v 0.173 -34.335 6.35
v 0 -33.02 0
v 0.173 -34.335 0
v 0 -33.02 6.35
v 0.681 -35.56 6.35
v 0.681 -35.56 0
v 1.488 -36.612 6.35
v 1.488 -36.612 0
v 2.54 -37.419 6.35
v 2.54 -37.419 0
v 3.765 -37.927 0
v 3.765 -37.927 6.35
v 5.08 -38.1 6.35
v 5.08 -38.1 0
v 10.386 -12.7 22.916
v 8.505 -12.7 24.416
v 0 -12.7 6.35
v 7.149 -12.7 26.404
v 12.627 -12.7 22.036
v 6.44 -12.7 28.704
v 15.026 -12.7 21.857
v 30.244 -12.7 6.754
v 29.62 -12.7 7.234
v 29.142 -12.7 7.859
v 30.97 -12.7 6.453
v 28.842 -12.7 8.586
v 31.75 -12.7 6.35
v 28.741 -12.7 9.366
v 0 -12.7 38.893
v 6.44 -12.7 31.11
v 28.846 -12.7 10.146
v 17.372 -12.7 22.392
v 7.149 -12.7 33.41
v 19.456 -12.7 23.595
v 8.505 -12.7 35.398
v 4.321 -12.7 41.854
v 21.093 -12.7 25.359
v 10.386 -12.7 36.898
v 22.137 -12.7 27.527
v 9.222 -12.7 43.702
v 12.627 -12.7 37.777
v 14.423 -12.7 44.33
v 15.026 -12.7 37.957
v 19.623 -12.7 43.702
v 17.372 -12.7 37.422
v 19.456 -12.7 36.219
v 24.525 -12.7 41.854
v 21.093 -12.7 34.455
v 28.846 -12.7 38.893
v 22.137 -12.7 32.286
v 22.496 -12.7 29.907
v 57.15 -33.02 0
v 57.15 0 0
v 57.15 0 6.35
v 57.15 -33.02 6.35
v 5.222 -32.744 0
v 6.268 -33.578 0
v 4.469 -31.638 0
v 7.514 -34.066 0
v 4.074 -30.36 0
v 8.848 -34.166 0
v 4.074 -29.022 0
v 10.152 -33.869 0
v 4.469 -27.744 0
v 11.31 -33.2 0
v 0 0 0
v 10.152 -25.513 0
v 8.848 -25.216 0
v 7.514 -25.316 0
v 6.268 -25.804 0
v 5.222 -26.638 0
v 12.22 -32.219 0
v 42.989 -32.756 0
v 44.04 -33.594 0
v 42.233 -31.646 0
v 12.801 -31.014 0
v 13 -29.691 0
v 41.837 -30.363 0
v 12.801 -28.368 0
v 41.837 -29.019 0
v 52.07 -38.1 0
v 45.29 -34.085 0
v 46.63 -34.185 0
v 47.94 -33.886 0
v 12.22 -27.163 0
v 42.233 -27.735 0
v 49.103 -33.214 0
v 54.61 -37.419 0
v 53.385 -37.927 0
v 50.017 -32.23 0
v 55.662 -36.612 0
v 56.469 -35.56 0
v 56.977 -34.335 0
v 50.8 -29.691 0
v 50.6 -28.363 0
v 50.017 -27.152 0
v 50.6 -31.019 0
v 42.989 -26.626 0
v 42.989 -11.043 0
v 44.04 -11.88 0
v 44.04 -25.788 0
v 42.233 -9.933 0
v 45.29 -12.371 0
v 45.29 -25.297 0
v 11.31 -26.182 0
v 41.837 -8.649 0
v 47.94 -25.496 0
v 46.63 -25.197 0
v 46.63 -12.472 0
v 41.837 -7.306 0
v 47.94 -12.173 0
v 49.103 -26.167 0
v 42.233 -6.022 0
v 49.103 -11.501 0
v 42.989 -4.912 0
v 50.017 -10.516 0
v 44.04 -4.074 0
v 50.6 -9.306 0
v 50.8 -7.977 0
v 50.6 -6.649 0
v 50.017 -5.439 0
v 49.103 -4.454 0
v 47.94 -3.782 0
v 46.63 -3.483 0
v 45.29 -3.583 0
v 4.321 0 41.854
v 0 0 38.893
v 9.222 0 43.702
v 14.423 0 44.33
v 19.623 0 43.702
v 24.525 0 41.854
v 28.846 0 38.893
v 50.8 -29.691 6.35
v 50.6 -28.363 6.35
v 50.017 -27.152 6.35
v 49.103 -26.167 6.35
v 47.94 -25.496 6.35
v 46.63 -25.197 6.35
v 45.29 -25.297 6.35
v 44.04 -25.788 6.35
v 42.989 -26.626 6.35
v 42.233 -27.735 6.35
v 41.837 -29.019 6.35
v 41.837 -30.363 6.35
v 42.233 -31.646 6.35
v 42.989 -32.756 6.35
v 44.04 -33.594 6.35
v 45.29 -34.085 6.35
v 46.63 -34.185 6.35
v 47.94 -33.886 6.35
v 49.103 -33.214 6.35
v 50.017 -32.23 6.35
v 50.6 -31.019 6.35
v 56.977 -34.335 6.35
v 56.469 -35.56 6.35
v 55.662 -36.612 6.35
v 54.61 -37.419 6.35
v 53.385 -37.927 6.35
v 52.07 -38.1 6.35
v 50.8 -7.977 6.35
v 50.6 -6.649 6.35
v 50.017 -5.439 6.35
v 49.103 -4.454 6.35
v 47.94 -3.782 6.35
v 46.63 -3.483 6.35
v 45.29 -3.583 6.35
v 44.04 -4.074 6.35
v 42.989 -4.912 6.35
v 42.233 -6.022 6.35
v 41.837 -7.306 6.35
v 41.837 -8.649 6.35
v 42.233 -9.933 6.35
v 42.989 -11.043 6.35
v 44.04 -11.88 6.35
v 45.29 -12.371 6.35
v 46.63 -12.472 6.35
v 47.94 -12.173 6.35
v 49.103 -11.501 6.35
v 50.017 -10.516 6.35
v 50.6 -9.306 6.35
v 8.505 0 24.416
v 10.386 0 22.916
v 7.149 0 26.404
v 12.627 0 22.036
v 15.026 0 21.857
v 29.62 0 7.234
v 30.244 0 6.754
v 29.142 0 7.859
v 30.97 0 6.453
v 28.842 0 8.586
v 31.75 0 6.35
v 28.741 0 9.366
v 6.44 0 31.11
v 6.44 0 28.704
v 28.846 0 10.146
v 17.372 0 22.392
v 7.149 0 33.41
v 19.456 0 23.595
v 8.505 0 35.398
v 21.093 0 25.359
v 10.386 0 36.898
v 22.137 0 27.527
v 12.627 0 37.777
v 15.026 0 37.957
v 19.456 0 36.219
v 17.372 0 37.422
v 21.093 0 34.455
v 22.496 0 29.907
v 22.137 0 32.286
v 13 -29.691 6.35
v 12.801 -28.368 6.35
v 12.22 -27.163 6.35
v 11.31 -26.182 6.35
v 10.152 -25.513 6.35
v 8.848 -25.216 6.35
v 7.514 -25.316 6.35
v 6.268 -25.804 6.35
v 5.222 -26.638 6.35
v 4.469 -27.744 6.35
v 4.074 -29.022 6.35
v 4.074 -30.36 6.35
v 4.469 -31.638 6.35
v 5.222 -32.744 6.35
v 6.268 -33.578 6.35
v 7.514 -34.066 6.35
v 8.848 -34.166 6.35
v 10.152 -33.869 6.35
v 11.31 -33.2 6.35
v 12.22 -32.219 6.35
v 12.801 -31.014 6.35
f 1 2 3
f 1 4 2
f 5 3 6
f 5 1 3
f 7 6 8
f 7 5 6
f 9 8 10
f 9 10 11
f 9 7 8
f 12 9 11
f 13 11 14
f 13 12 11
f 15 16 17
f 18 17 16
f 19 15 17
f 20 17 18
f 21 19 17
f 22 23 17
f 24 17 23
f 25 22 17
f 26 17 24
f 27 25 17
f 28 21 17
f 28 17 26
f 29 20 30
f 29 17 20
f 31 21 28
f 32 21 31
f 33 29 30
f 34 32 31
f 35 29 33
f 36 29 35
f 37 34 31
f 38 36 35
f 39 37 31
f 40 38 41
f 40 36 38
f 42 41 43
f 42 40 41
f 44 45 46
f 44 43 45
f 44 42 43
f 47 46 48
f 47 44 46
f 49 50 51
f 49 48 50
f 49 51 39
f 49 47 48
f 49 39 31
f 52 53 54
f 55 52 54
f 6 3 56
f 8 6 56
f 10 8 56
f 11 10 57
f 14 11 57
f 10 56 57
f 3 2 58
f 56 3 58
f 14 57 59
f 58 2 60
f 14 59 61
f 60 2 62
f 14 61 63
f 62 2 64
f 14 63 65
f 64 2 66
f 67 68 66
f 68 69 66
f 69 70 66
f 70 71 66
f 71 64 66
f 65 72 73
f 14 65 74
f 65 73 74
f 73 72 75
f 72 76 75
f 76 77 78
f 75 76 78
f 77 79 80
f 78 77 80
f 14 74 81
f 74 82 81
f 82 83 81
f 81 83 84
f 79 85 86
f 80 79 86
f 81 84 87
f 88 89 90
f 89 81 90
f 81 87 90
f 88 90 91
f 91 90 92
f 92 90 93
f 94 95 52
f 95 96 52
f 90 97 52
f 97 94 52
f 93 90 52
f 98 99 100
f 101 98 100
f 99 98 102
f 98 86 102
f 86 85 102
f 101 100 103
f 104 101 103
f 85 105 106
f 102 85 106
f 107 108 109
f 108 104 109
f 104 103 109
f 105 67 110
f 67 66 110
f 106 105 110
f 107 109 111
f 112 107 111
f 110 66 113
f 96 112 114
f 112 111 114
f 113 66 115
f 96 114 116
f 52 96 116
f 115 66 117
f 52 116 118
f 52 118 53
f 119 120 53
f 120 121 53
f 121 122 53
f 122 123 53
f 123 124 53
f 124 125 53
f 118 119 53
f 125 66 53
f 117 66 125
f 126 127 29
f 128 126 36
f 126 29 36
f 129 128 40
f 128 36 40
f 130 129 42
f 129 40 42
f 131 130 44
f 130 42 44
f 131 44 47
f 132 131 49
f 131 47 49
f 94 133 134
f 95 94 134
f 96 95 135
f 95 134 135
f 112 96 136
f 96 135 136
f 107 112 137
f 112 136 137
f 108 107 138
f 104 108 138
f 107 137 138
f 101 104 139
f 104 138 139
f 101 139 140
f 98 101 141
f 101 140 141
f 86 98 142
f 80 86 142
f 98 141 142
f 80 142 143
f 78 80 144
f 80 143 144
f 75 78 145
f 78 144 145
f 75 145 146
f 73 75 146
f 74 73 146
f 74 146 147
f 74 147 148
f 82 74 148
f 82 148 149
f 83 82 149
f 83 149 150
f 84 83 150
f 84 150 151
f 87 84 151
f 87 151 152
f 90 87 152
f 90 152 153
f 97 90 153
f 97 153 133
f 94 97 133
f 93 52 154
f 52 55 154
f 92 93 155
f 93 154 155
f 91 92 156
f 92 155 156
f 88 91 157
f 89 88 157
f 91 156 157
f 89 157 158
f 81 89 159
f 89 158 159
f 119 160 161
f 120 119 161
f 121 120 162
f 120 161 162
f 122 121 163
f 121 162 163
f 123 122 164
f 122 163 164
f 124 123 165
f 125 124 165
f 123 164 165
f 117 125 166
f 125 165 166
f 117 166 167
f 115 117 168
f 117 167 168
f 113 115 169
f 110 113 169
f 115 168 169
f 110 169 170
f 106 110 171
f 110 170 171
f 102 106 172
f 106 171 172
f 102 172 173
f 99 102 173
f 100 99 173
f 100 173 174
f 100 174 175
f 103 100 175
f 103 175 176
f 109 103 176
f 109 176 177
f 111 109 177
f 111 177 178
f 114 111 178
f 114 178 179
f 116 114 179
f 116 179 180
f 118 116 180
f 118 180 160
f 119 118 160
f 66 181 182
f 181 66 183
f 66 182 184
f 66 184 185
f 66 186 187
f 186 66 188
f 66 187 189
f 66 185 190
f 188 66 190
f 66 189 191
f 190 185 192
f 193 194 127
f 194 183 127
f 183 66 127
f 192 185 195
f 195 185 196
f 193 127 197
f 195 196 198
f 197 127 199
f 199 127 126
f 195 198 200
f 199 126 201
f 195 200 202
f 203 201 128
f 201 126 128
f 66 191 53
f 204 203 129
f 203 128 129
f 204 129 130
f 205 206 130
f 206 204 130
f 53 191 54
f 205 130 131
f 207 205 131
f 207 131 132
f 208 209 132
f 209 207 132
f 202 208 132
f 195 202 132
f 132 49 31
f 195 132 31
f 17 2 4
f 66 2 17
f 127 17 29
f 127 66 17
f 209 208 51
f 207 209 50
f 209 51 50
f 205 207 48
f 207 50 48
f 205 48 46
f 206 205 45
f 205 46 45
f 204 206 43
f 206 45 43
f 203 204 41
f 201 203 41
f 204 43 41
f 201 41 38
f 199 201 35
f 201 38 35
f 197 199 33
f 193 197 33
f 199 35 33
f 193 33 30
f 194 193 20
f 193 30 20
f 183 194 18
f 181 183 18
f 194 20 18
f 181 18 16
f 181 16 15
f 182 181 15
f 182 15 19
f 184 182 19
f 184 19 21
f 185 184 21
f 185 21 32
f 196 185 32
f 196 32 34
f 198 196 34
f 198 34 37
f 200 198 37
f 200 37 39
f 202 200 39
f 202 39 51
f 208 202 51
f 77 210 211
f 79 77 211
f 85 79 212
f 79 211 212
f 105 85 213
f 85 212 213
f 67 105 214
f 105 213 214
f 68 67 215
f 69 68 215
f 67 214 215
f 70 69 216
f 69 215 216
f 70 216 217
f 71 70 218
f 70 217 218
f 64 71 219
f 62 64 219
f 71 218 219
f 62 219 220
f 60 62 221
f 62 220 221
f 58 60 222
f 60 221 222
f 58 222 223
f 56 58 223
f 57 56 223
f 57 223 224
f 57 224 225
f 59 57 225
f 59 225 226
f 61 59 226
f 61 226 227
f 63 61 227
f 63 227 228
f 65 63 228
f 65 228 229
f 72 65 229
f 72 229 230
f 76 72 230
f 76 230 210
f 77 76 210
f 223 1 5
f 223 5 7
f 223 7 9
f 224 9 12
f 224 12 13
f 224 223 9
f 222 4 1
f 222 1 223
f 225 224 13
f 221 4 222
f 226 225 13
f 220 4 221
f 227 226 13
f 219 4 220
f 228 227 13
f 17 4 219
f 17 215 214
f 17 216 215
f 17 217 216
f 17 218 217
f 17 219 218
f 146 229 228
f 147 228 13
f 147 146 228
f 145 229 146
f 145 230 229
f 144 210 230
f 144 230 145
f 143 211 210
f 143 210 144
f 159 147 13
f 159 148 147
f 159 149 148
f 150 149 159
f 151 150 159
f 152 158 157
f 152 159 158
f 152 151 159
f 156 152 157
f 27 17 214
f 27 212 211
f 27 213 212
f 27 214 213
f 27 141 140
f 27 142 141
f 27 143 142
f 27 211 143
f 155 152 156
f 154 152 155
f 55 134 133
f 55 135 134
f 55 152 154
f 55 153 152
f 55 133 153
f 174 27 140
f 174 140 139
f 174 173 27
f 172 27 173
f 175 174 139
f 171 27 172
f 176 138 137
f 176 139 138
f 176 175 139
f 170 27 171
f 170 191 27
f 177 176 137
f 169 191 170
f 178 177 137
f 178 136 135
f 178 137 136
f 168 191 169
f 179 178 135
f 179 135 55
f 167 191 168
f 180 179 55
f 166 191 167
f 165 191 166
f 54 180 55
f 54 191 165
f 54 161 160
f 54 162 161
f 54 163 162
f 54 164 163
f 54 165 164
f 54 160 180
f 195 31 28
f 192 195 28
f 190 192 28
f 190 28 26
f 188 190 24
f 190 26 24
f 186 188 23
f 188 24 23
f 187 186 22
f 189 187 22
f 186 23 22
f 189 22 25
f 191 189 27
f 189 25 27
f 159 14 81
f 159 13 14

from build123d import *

# Parameters (mm, degrees)
F0_W      = 57.15
F0_H      = 6.35
F1_DEPTH  = 38.1
F2_R      = 5.08
F3_W      = 31.75
F3_H      = 38.1
F4_DEPTH  = 12.7
F6_DEPTH  = 25.4
F7_R      = 8.072942
F8_DEPTH  = 25.4
F9_R      = 4.506812
F9_R_2    = 4.48794
F10_DEPTH = 25.4


with BuildPart() as f1:
    # F0 (on Front) → F1 (new body)
    with BuildSketch(Plane.XZ):
        with Locations((28.575, 3.175)):
            Rectangle(F0_W, F0_H)
    extrude(amount=F1_DEPTH)

    # F2
    f2_edges = [f1.edges().sort_by_distance(p)[0] for p in [
        (0, -38.1, 3.175),
        (57.15, -38.1, 3.175),
    ]]
    fillet(f2_edges, radius=F2_R)

    # F3 (on Front) → F4 (join)
    with BuildSketch(Plane.XZ):
        with Locations((15.875, 25.30028)):
            Rectangle(F3_W, F3_H)
    extrude(amount=F4_DEPTH)

    # F5 (on face) → F6 (cut)
    with BuildSketch(Plane.XZ.offset(12.7)):
        with BuildLine():
            Line((28.845884, 38.892605), (28.845884, 10.145596))
            ThreePointArc((28.845884, 10.145596), (29.360416, 7.530471), (31.75, 6.35))
            Line((31.75, 6.35), (31.75, 44.35028))
            Line((31.75, 44.35028), (0, 44.35028))
            Line((0, 44.35028), (0, 38.892605))
            ThreePointArc((0, 38.892605), (14.422942, 44.329867), (28.845884, 38.892605))
        make_face()
    extrude(amount=-F6_DEPTH, mode=Mode.SUBTRACT)

    # F7 (on face) → F8 (cut)
    with BuildSketch(Plane.XZ.offset(12.7)):
        with Locations((14.422942, 29.906925)):
            Circle(F7_R)
    extrude(amount=-F8_DEPTH, mode=Mode.SUBTRACT)

    # F9 (on face) → F10 (cut)
    with BuildSketch(Plane.XY.offset(6.35)):
        with Locations((46.293188, -29.690929)):
            Circle(F9_R)
        with Locations((46.293188, -7.977305)):
            Circle(F9_R)
        with Locations((8.512264, -29.690929)):
            Circle(F9_R_2)
    extrude(amount=-F10_DEPTH, mode=Mode.SUBTRACT)


solid = f1.part
